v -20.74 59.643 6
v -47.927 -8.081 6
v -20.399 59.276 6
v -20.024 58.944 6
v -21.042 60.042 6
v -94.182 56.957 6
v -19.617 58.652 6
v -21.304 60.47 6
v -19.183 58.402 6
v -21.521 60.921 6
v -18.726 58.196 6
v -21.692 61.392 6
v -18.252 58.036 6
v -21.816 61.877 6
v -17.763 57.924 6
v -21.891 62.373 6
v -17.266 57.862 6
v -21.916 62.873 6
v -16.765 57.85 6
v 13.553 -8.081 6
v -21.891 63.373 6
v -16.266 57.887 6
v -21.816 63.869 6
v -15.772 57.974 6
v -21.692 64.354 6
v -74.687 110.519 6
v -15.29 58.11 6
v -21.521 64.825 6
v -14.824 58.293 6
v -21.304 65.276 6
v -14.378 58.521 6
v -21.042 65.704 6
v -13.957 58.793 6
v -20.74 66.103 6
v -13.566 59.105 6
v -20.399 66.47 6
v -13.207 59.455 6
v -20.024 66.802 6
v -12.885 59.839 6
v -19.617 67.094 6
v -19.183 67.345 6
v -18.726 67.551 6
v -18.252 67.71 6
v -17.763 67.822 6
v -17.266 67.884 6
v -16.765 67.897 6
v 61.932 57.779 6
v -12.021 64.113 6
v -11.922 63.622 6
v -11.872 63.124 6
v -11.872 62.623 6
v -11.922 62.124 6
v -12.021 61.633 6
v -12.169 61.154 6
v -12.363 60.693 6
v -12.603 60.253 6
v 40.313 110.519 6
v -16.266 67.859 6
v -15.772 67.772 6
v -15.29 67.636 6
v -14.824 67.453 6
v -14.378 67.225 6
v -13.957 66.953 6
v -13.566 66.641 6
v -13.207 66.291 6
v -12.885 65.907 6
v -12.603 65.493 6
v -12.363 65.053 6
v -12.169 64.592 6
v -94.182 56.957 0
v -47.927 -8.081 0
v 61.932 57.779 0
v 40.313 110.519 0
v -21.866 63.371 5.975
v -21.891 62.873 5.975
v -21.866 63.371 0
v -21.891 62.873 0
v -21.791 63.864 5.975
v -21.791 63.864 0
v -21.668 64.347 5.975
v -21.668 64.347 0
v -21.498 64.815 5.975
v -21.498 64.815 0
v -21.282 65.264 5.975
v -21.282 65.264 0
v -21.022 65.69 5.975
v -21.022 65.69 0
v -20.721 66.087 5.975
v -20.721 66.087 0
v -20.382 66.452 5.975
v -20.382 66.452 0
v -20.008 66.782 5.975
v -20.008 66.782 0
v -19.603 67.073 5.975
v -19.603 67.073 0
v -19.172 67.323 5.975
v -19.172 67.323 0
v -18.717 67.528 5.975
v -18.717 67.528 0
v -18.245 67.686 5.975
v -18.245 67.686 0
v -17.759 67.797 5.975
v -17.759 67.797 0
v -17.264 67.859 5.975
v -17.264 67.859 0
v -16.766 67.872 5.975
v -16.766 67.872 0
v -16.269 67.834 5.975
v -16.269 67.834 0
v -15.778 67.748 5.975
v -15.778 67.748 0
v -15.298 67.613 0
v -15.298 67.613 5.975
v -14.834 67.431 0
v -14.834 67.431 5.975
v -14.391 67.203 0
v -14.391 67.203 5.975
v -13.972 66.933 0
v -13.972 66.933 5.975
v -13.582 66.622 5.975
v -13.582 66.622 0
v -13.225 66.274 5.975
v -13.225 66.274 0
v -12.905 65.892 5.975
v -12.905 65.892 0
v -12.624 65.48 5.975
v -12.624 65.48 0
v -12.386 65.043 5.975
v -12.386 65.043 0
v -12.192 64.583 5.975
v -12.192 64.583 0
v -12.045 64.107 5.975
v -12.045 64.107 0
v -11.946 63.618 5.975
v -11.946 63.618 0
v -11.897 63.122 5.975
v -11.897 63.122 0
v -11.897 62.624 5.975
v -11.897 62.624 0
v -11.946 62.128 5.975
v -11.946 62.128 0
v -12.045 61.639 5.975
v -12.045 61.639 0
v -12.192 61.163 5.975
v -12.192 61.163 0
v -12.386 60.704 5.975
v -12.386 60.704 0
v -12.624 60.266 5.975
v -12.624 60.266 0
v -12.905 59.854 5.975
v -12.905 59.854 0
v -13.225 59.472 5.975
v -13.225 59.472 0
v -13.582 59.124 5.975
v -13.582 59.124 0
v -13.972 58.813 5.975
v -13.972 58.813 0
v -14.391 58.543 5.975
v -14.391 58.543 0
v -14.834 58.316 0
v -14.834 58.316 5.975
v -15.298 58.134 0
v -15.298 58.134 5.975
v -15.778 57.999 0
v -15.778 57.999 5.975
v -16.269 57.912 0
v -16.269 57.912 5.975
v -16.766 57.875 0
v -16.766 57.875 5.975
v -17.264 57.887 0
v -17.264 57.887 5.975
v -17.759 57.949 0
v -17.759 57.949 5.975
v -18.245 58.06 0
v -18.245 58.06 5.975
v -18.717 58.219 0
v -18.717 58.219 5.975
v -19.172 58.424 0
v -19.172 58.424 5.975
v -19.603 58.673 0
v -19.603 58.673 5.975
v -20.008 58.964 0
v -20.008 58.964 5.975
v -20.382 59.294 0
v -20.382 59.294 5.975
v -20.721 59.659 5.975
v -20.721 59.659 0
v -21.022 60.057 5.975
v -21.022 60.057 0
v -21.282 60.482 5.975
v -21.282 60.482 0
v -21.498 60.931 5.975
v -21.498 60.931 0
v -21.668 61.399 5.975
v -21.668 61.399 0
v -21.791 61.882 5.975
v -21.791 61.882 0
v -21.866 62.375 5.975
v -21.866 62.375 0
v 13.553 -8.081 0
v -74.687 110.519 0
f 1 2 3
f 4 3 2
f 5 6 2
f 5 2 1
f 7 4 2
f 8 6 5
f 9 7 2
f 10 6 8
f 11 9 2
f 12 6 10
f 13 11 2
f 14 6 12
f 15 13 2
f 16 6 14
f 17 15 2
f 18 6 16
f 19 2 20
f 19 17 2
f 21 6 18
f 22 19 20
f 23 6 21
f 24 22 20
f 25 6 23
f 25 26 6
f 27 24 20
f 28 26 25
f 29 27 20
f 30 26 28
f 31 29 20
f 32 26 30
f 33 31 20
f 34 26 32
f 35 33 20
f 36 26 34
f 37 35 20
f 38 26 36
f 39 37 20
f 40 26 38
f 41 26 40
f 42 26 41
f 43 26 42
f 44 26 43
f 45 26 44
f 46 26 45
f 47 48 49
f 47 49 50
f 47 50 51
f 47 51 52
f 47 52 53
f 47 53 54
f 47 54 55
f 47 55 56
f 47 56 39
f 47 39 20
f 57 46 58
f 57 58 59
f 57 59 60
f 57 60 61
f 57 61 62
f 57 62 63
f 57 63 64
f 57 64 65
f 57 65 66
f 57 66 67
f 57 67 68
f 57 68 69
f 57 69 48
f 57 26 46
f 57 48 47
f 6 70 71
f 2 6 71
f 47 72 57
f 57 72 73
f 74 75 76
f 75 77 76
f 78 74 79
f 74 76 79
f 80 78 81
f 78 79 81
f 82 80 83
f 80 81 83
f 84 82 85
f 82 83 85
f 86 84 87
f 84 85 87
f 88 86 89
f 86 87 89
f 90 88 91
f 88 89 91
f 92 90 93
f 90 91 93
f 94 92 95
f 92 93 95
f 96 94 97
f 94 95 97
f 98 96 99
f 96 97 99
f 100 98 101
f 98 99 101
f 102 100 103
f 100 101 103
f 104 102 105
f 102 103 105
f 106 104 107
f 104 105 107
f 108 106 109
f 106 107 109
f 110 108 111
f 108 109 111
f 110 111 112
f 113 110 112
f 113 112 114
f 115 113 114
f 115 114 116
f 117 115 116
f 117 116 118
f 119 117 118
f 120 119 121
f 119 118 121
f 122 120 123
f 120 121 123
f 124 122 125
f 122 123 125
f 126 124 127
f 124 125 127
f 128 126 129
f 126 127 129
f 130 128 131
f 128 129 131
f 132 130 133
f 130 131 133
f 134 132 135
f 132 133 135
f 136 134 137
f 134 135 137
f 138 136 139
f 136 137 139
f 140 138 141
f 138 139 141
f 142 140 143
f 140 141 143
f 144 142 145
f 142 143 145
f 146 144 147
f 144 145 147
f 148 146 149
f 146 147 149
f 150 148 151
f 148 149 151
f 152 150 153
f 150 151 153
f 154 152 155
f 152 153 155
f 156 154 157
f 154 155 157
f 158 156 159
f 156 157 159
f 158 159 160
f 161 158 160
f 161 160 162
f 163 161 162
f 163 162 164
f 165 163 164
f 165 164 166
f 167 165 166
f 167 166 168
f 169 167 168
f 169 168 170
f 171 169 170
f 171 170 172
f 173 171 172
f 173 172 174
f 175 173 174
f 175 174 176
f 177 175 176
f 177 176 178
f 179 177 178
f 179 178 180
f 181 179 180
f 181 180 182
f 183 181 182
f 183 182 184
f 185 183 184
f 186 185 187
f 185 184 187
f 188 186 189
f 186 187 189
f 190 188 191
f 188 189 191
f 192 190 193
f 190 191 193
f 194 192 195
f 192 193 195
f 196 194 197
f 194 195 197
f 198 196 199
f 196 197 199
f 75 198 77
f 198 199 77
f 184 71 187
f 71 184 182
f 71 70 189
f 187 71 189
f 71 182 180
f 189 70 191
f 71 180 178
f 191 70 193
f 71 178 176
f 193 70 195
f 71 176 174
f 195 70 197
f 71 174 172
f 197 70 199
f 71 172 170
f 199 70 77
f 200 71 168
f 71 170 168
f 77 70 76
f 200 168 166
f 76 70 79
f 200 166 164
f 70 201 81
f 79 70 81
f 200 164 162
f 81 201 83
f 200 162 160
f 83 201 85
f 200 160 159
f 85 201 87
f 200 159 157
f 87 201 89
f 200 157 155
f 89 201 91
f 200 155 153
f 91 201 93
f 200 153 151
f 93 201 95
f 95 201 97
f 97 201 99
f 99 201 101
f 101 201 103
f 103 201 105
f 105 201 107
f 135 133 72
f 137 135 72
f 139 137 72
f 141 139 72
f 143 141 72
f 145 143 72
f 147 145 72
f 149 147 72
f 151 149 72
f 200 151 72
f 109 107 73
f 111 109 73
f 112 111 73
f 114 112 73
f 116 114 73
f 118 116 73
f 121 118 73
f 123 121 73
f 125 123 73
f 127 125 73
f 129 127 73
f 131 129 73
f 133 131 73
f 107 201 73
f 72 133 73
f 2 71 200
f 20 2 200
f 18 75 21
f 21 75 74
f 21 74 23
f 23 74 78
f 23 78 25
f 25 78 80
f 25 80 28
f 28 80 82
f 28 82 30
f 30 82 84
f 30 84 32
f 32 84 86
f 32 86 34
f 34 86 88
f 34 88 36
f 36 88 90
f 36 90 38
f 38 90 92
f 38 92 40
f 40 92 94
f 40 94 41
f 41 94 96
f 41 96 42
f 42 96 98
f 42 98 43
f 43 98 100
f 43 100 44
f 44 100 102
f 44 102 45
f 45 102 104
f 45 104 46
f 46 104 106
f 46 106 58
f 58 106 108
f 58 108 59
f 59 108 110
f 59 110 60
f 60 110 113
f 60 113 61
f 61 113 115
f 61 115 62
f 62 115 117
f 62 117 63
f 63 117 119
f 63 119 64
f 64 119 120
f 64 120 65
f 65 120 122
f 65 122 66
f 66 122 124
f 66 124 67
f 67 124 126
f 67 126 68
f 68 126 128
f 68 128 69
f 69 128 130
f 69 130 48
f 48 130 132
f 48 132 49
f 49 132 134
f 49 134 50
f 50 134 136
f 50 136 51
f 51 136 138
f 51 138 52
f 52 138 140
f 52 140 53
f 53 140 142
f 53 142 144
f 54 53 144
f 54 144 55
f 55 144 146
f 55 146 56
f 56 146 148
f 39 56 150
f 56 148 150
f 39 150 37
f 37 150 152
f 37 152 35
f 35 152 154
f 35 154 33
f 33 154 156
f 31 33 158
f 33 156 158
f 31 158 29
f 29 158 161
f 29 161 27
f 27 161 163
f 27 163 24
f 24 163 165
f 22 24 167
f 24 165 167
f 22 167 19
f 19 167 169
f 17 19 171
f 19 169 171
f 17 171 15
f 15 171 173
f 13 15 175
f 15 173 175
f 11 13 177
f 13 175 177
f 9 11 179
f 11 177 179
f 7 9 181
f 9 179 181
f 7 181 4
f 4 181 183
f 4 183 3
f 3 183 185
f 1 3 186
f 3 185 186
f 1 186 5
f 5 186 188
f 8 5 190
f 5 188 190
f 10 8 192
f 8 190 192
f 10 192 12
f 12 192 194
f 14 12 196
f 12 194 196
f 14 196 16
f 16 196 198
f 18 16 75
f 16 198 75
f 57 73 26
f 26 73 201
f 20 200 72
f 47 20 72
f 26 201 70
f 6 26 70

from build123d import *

# Parameters (mm, degrees)
BOSS_EXTRUDE1_DEPTH              = 6
F_10_0MM_DOWEL_HOLE2_D           = 10
F_10_0MM_DOWEL_HOLE2_DEPTH       = 50
F_10_0MM_DOWEL_HOLE2_CSINK_D     = 10.05
F_10_0MM_DOWEL_HOLE2_CSINK_ANGLE = 90
F_10_0MM_DOWEL_HOLE2_TIP         = 3.004303095


with BuildPart() as part:
    # Sketch1 → Boss-Extrude1 (new body)
    with BuildSketch(Plane.XY):
        Polygon((-47.927135712, -8.080790765), (13.552864288, -8.080790765), (61.932230114, 57.778577521), (40.312864288, 110.519482152), (-74.687135712, 110.519482152), (-94.182283881, 56.957002767), align=None)
    extrude(amount=BOSS_EXTRUDE1_DEPTH)

    # Ø10.0mm Dowel Hole2
    with Locations(Plane.XY.offset(6)):
        with Locations((-16.890604688, 62.873141165)):
            CounterSinkHole(F_10_0MM_DOWEL_HOLE2_D / 2, F_10_0MM_DOWEL_HOLE2_CSINK_D / 2, depth=F_10_0MM_DOWEL_HOLE2_DEPTH, counter_sink_angle=F_10_0MM_DOWEL_HOLE2_CSINK_ANGLE)
            with Locations((0, 0, -(F_10_0MM_DOWEL_HOLE2_DEPTH + F_10_0MM_DOWEL_HOLE2_TIP / 2))):  # 118° drill point
                Cone(0, F_10_0MM_DOWEL_HOLE2_D / 2, F_10_0MM_DOWEL_HOLE2_TIP, mode=Mode.SUBTRACT)


solid = part.part
